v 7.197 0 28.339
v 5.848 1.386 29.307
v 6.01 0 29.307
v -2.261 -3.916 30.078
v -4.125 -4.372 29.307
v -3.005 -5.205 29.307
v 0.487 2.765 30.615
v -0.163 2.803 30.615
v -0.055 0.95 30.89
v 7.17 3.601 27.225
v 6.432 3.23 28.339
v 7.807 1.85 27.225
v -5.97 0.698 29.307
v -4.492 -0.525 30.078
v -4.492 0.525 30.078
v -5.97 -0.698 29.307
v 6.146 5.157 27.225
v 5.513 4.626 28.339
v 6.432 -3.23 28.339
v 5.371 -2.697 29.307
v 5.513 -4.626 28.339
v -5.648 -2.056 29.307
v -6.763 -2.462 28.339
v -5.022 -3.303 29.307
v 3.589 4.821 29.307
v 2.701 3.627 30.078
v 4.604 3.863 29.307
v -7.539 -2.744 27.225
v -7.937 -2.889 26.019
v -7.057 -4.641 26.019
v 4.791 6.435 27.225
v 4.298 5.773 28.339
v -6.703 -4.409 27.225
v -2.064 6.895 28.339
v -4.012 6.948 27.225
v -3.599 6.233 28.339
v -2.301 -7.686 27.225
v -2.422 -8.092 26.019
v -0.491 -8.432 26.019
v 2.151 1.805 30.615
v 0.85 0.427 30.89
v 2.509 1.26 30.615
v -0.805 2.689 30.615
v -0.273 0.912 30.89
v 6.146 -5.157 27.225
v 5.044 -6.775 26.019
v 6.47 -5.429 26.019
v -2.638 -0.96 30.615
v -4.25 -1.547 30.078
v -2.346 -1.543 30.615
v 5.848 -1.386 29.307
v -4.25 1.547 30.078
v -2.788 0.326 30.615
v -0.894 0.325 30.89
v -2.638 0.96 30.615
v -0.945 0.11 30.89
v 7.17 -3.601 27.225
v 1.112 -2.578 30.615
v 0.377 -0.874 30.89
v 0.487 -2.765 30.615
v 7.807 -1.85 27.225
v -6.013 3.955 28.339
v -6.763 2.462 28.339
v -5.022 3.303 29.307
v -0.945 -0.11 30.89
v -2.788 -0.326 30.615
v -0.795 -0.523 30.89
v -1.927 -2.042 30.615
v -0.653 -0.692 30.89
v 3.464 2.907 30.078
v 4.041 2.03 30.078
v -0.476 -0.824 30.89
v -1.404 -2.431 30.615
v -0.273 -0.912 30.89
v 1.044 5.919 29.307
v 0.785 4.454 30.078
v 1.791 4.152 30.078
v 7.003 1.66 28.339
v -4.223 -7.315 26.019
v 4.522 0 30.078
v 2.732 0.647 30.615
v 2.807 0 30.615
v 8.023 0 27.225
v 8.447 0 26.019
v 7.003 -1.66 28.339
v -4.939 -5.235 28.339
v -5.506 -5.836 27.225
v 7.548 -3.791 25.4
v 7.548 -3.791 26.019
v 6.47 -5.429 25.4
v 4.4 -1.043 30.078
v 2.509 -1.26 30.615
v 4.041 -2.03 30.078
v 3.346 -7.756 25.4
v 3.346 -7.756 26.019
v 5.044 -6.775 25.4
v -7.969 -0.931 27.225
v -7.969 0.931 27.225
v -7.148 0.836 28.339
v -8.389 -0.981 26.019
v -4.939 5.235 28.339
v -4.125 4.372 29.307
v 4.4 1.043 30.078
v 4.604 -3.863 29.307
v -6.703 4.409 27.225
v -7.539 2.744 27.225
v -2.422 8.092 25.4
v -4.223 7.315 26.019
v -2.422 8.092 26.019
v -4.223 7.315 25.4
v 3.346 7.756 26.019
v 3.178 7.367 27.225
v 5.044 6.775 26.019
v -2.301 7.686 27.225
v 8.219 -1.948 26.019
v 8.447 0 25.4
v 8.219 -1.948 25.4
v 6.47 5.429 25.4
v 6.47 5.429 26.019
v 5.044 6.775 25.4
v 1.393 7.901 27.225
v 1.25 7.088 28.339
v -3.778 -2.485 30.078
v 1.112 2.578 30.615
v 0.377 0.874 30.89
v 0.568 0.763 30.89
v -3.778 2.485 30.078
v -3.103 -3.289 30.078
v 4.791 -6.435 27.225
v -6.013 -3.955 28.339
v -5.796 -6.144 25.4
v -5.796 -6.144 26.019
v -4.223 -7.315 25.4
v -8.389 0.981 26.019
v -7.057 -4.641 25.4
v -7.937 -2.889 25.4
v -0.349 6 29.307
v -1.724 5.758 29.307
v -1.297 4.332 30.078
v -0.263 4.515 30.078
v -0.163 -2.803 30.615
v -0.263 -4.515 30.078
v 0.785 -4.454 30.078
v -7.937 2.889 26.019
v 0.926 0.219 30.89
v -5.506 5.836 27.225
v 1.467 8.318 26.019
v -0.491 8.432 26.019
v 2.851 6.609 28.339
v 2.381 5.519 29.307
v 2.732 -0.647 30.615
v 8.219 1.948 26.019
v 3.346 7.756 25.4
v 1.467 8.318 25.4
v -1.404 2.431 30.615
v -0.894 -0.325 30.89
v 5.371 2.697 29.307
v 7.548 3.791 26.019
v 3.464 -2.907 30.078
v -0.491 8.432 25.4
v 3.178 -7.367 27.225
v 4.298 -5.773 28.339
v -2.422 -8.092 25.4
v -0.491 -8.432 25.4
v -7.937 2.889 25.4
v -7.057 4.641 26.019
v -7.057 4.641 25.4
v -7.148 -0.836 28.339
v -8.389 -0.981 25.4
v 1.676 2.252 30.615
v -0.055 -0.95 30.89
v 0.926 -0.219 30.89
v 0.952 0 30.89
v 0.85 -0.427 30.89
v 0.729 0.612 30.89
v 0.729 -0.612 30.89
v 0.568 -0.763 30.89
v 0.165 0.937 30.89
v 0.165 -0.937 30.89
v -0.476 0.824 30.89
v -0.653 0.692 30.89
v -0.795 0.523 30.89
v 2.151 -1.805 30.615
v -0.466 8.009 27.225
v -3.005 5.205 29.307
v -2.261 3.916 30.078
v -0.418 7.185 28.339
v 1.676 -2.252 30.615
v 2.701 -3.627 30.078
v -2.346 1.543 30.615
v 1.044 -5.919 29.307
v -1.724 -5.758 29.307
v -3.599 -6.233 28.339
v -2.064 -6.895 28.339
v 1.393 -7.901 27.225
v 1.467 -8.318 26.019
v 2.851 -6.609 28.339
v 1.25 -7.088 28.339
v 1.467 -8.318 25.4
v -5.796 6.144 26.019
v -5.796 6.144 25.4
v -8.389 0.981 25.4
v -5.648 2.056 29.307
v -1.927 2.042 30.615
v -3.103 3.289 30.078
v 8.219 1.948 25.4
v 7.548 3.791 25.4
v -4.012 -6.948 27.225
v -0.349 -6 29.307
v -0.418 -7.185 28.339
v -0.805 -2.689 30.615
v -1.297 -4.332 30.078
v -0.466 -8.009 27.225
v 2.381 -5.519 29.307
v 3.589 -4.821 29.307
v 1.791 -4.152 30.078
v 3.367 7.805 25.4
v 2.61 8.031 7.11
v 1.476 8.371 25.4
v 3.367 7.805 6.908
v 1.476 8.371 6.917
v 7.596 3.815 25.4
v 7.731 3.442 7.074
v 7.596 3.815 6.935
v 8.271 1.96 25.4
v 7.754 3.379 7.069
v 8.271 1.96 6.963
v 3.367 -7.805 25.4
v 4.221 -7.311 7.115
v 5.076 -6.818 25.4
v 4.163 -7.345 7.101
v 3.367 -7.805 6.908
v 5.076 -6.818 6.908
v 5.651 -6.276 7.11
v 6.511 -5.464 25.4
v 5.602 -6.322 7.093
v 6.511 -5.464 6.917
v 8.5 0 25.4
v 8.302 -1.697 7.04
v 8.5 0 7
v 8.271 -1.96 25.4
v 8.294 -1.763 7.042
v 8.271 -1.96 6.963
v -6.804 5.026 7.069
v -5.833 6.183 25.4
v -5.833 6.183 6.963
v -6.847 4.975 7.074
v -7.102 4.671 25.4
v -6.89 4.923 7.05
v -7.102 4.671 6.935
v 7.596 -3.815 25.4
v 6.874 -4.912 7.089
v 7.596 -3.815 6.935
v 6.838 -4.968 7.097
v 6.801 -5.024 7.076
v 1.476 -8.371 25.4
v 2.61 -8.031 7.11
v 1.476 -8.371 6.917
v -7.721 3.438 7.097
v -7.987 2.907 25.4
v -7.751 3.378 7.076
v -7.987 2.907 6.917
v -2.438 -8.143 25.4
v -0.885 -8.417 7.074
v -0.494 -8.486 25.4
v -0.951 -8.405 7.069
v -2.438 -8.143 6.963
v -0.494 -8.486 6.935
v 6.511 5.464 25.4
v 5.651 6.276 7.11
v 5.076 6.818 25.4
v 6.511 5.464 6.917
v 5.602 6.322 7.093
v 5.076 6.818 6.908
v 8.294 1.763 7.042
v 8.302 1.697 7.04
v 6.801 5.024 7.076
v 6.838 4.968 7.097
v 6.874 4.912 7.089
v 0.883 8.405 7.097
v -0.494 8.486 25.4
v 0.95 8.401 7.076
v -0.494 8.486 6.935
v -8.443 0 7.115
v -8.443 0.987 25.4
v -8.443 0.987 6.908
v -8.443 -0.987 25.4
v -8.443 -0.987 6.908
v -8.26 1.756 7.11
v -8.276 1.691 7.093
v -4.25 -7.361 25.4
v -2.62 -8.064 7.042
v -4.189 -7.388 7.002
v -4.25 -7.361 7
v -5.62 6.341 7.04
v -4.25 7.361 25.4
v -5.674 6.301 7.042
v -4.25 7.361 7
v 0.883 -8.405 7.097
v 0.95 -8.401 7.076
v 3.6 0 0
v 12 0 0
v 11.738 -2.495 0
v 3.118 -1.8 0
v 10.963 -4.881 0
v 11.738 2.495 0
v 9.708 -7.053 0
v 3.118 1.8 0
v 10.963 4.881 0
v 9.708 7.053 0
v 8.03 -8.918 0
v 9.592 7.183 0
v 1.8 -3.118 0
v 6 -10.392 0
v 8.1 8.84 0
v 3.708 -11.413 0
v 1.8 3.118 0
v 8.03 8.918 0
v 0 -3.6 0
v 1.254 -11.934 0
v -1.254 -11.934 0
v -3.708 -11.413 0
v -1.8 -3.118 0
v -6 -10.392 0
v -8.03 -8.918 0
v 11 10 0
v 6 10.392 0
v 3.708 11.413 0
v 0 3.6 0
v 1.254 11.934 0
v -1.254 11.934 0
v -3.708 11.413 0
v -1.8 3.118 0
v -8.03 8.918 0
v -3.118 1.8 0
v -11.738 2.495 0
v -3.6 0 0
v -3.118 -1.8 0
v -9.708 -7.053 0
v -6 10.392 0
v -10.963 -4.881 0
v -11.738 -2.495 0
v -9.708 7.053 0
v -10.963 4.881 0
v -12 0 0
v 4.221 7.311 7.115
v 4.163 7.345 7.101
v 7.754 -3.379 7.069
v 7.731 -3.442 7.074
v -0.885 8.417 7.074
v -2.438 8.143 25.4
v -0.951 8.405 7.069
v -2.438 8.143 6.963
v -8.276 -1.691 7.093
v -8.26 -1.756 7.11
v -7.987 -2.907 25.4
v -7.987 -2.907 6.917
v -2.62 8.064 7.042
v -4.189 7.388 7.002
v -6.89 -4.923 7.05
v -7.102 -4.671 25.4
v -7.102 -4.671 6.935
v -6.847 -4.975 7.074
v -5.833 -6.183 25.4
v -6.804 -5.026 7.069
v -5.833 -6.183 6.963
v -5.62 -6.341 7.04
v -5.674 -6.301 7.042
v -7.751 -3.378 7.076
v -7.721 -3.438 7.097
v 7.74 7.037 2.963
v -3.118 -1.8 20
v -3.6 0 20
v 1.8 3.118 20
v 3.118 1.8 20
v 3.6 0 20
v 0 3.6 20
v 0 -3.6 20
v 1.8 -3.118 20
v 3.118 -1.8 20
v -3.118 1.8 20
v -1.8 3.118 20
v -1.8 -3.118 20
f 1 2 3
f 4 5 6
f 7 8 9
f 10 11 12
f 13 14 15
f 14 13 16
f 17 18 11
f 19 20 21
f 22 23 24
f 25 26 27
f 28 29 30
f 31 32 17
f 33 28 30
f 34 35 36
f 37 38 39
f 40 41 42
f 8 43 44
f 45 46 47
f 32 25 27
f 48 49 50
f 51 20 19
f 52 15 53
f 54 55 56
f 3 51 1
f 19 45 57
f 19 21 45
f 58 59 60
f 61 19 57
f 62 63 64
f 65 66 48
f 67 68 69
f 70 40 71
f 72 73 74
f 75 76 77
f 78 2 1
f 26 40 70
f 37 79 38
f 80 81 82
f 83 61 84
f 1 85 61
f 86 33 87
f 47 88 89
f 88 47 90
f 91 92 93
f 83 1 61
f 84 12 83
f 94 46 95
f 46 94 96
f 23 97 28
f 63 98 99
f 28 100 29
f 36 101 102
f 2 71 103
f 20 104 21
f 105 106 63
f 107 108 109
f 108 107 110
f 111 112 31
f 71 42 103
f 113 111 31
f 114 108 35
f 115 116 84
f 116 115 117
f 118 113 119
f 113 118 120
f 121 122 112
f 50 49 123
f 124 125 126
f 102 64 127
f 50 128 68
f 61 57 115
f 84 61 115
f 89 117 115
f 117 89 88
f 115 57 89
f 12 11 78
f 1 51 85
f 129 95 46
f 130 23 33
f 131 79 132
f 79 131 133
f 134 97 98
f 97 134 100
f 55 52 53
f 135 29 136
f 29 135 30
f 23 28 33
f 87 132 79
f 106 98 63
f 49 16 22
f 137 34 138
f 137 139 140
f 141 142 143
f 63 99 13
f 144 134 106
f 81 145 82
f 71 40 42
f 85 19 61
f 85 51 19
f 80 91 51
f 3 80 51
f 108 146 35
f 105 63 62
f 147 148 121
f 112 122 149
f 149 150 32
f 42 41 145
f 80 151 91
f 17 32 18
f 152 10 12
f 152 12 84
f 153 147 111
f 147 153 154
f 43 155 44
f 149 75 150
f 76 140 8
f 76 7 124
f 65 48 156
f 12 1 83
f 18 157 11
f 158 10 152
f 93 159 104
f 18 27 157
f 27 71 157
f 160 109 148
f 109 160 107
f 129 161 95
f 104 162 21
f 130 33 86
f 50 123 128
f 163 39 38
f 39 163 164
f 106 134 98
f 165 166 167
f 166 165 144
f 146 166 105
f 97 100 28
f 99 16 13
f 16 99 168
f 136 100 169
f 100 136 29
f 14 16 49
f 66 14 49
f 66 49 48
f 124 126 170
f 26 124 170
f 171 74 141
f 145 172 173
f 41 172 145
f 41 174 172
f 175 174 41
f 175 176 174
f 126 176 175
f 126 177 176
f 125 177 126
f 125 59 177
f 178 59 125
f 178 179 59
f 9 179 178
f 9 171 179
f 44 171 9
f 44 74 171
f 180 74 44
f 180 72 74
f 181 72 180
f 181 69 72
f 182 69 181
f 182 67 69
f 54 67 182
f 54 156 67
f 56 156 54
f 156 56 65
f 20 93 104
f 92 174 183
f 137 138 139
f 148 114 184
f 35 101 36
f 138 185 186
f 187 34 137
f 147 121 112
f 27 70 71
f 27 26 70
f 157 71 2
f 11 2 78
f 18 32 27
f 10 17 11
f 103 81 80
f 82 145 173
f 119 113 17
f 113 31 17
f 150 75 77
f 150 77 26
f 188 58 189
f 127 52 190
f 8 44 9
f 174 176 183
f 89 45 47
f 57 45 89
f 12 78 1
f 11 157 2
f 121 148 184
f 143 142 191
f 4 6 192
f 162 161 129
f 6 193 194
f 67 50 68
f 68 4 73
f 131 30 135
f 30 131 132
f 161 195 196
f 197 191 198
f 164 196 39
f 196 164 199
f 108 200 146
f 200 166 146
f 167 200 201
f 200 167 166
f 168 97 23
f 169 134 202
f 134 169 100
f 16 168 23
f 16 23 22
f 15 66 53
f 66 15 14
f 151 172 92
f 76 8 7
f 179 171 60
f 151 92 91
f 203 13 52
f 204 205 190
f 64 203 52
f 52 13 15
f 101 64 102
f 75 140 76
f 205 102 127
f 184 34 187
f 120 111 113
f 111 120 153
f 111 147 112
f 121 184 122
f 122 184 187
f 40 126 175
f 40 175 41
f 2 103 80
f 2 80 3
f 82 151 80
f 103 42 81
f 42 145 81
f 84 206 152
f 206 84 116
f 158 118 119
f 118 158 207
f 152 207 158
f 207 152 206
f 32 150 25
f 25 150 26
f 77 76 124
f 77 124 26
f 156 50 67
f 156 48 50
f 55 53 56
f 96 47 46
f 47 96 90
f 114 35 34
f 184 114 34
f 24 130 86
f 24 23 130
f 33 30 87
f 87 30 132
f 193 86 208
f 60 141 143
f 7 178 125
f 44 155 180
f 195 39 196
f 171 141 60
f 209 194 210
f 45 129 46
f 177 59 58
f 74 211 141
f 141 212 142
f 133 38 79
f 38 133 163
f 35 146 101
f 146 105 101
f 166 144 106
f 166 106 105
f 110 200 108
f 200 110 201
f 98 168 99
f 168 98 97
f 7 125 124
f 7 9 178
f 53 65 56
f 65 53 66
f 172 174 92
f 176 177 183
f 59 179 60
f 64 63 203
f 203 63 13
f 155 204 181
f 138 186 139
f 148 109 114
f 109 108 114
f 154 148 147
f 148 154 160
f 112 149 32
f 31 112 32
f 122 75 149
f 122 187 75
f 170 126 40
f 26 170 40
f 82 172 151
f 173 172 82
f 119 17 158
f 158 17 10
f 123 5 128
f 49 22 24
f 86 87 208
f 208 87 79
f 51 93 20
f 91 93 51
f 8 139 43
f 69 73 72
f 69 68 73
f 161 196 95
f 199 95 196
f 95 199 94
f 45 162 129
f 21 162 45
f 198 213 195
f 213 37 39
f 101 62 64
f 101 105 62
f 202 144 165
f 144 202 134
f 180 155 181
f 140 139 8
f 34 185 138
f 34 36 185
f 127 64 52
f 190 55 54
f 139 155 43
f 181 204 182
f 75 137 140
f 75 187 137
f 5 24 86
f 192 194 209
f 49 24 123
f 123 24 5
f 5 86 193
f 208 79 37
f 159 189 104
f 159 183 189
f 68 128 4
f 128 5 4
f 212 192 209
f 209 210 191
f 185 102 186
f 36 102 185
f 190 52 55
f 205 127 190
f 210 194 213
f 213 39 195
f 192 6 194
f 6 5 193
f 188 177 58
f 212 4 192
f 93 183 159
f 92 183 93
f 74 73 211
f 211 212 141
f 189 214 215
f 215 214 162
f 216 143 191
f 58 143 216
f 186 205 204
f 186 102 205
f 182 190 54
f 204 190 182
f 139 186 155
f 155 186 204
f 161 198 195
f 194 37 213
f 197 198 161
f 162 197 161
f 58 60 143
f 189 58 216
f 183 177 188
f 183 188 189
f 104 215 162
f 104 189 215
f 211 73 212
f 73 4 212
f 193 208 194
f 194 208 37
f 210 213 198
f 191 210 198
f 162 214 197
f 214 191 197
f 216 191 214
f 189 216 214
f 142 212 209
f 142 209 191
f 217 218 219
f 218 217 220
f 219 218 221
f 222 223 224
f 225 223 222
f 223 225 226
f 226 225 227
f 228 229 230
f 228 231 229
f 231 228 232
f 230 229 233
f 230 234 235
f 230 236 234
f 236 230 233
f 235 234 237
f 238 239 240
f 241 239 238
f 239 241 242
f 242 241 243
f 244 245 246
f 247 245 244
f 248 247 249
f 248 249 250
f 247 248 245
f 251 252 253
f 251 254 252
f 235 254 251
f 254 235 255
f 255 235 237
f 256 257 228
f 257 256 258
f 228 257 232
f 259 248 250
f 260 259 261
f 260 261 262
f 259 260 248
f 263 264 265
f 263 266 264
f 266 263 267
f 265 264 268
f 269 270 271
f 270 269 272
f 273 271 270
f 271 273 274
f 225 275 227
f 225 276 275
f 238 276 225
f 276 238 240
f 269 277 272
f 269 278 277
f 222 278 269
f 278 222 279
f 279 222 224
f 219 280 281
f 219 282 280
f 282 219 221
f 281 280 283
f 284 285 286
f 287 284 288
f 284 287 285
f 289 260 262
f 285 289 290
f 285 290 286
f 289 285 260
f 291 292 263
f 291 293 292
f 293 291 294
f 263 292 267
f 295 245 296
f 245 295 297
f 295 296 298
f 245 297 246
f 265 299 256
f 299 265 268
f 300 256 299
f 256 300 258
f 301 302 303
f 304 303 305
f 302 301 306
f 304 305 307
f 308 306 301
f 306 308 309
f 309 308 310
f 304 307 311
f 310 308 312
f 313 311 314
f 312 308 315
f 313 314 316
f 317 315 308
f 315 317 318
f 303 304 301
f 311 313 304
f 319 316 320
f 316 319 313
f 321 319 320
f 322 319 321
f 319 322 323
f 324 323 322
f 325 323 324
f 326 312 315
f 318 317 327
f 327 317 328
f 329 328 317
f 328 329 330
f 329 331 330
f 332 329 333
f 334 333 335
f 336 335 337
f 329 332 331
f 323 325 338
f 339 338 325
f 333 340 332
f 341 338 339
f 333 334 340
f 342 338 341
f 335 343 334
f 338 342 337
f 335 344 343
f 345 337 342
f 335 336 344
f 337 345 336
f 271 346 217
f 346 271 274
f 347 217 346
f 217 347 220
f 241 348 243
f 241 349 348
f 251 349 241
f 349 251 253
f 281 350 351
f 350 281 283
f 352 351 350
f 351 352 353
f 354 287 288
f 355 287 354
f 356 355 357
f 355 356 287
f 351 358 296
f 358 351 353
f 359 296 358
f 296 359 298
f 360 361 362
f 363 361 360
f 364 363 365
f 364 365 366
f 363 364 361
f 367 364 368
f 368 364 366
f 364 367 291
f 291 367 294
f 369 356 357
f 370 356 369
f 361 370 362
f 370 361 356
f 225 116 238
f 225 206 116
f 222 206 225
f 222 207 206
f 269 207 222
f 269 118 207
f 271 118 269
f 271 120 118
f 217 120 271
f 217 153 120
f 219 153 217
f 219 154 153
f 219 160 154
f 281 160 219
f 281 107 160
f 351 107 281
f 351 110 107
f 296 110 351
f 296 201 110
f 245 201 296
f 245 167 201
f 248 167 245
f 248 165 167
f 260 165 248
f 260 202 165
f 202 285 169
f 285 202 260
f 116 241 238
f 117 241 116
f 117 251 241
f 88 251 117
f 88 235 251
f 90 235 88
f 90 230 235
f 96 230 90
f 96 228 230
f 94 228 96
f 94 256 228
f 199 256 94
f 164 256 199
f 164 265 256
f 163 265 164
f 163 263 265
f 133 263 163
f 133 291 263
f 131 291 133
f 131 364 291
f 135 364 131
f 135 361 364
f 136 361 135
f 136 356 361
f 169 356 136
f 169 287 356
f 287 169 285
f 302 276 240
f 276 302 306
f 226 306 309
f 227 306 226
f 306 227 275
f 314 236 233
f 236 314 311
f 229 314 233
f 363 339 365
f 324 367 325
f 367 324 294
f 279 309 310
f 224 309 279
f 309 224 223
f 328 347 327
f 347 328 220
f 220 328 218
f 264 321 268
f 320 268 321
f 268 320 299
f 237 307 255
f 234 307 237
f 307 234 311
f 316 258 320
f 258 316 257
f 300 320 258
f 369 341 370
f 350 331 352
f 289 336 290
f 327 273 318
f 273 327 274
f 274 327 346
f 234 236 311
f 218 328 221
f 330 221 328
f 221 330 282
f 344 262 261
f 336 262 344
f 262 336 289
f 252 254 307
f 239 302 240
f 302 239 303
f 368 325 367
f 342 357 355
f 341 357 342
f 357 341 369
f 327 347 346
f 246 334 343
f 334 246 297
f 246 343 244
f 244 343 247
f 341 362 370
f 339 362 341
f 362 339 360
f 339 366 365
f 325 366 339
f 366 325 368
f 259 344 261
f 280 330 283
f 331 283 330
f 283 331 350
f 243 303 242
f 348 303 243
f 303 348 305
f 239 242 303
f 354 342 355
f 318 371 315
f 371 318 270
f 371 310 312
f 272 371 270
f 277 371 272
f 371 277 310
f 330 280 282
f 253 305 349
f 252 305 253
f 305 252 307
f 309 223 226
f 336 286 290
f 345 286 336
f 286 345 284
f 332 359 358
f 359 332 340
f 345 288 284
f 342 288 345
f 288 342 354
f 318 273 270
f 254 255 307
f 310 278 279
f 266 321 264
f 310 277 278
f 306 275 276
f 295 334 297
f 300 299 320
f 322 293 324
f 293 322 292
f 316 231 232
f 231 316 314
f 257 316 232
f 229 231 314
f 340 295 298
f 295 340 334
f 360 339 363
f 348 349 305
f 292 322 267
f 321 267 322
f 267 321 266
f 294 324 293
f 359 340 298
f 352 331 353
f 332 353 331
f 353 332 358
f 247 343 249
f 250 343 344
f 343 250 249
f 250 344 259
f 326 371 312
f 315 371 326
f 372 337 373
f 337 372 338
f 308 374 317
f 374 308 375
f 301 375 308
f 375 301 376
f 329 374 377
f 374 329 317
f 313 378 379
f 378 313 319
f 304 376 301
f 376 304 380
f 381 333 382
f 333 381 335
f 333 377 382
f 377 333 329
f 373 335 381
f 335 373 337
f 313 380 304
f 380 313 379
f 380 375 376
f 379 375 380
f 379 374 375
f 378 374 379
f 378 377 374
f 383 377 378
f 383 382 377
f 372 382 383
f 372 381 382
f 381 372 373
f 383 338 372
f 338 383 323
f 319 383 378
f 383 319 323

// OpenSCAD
difference(){

	union(){
translate([0,0,25.4]) scale([	1, 1, .65]) sphere(8.5,8.5, 8.5);
cylinder(25.4, 8.5, 8.5);
cylinder(22, 12, 1);
polyhedron(
  points=[ [11,10,0],[4,-4,0],[-4,-4,0],[-4,4,0], 
           [0,0,10]  ],                                 
  triangles=[ [0,1,4],[1,2,4],[2,3,4],[3,0,4],          
              [1,0,3],[2,1,3] ]                         
 );
}
	#translate([0,0,-2]) cylinder(22, 3.6, 3.6);
}
